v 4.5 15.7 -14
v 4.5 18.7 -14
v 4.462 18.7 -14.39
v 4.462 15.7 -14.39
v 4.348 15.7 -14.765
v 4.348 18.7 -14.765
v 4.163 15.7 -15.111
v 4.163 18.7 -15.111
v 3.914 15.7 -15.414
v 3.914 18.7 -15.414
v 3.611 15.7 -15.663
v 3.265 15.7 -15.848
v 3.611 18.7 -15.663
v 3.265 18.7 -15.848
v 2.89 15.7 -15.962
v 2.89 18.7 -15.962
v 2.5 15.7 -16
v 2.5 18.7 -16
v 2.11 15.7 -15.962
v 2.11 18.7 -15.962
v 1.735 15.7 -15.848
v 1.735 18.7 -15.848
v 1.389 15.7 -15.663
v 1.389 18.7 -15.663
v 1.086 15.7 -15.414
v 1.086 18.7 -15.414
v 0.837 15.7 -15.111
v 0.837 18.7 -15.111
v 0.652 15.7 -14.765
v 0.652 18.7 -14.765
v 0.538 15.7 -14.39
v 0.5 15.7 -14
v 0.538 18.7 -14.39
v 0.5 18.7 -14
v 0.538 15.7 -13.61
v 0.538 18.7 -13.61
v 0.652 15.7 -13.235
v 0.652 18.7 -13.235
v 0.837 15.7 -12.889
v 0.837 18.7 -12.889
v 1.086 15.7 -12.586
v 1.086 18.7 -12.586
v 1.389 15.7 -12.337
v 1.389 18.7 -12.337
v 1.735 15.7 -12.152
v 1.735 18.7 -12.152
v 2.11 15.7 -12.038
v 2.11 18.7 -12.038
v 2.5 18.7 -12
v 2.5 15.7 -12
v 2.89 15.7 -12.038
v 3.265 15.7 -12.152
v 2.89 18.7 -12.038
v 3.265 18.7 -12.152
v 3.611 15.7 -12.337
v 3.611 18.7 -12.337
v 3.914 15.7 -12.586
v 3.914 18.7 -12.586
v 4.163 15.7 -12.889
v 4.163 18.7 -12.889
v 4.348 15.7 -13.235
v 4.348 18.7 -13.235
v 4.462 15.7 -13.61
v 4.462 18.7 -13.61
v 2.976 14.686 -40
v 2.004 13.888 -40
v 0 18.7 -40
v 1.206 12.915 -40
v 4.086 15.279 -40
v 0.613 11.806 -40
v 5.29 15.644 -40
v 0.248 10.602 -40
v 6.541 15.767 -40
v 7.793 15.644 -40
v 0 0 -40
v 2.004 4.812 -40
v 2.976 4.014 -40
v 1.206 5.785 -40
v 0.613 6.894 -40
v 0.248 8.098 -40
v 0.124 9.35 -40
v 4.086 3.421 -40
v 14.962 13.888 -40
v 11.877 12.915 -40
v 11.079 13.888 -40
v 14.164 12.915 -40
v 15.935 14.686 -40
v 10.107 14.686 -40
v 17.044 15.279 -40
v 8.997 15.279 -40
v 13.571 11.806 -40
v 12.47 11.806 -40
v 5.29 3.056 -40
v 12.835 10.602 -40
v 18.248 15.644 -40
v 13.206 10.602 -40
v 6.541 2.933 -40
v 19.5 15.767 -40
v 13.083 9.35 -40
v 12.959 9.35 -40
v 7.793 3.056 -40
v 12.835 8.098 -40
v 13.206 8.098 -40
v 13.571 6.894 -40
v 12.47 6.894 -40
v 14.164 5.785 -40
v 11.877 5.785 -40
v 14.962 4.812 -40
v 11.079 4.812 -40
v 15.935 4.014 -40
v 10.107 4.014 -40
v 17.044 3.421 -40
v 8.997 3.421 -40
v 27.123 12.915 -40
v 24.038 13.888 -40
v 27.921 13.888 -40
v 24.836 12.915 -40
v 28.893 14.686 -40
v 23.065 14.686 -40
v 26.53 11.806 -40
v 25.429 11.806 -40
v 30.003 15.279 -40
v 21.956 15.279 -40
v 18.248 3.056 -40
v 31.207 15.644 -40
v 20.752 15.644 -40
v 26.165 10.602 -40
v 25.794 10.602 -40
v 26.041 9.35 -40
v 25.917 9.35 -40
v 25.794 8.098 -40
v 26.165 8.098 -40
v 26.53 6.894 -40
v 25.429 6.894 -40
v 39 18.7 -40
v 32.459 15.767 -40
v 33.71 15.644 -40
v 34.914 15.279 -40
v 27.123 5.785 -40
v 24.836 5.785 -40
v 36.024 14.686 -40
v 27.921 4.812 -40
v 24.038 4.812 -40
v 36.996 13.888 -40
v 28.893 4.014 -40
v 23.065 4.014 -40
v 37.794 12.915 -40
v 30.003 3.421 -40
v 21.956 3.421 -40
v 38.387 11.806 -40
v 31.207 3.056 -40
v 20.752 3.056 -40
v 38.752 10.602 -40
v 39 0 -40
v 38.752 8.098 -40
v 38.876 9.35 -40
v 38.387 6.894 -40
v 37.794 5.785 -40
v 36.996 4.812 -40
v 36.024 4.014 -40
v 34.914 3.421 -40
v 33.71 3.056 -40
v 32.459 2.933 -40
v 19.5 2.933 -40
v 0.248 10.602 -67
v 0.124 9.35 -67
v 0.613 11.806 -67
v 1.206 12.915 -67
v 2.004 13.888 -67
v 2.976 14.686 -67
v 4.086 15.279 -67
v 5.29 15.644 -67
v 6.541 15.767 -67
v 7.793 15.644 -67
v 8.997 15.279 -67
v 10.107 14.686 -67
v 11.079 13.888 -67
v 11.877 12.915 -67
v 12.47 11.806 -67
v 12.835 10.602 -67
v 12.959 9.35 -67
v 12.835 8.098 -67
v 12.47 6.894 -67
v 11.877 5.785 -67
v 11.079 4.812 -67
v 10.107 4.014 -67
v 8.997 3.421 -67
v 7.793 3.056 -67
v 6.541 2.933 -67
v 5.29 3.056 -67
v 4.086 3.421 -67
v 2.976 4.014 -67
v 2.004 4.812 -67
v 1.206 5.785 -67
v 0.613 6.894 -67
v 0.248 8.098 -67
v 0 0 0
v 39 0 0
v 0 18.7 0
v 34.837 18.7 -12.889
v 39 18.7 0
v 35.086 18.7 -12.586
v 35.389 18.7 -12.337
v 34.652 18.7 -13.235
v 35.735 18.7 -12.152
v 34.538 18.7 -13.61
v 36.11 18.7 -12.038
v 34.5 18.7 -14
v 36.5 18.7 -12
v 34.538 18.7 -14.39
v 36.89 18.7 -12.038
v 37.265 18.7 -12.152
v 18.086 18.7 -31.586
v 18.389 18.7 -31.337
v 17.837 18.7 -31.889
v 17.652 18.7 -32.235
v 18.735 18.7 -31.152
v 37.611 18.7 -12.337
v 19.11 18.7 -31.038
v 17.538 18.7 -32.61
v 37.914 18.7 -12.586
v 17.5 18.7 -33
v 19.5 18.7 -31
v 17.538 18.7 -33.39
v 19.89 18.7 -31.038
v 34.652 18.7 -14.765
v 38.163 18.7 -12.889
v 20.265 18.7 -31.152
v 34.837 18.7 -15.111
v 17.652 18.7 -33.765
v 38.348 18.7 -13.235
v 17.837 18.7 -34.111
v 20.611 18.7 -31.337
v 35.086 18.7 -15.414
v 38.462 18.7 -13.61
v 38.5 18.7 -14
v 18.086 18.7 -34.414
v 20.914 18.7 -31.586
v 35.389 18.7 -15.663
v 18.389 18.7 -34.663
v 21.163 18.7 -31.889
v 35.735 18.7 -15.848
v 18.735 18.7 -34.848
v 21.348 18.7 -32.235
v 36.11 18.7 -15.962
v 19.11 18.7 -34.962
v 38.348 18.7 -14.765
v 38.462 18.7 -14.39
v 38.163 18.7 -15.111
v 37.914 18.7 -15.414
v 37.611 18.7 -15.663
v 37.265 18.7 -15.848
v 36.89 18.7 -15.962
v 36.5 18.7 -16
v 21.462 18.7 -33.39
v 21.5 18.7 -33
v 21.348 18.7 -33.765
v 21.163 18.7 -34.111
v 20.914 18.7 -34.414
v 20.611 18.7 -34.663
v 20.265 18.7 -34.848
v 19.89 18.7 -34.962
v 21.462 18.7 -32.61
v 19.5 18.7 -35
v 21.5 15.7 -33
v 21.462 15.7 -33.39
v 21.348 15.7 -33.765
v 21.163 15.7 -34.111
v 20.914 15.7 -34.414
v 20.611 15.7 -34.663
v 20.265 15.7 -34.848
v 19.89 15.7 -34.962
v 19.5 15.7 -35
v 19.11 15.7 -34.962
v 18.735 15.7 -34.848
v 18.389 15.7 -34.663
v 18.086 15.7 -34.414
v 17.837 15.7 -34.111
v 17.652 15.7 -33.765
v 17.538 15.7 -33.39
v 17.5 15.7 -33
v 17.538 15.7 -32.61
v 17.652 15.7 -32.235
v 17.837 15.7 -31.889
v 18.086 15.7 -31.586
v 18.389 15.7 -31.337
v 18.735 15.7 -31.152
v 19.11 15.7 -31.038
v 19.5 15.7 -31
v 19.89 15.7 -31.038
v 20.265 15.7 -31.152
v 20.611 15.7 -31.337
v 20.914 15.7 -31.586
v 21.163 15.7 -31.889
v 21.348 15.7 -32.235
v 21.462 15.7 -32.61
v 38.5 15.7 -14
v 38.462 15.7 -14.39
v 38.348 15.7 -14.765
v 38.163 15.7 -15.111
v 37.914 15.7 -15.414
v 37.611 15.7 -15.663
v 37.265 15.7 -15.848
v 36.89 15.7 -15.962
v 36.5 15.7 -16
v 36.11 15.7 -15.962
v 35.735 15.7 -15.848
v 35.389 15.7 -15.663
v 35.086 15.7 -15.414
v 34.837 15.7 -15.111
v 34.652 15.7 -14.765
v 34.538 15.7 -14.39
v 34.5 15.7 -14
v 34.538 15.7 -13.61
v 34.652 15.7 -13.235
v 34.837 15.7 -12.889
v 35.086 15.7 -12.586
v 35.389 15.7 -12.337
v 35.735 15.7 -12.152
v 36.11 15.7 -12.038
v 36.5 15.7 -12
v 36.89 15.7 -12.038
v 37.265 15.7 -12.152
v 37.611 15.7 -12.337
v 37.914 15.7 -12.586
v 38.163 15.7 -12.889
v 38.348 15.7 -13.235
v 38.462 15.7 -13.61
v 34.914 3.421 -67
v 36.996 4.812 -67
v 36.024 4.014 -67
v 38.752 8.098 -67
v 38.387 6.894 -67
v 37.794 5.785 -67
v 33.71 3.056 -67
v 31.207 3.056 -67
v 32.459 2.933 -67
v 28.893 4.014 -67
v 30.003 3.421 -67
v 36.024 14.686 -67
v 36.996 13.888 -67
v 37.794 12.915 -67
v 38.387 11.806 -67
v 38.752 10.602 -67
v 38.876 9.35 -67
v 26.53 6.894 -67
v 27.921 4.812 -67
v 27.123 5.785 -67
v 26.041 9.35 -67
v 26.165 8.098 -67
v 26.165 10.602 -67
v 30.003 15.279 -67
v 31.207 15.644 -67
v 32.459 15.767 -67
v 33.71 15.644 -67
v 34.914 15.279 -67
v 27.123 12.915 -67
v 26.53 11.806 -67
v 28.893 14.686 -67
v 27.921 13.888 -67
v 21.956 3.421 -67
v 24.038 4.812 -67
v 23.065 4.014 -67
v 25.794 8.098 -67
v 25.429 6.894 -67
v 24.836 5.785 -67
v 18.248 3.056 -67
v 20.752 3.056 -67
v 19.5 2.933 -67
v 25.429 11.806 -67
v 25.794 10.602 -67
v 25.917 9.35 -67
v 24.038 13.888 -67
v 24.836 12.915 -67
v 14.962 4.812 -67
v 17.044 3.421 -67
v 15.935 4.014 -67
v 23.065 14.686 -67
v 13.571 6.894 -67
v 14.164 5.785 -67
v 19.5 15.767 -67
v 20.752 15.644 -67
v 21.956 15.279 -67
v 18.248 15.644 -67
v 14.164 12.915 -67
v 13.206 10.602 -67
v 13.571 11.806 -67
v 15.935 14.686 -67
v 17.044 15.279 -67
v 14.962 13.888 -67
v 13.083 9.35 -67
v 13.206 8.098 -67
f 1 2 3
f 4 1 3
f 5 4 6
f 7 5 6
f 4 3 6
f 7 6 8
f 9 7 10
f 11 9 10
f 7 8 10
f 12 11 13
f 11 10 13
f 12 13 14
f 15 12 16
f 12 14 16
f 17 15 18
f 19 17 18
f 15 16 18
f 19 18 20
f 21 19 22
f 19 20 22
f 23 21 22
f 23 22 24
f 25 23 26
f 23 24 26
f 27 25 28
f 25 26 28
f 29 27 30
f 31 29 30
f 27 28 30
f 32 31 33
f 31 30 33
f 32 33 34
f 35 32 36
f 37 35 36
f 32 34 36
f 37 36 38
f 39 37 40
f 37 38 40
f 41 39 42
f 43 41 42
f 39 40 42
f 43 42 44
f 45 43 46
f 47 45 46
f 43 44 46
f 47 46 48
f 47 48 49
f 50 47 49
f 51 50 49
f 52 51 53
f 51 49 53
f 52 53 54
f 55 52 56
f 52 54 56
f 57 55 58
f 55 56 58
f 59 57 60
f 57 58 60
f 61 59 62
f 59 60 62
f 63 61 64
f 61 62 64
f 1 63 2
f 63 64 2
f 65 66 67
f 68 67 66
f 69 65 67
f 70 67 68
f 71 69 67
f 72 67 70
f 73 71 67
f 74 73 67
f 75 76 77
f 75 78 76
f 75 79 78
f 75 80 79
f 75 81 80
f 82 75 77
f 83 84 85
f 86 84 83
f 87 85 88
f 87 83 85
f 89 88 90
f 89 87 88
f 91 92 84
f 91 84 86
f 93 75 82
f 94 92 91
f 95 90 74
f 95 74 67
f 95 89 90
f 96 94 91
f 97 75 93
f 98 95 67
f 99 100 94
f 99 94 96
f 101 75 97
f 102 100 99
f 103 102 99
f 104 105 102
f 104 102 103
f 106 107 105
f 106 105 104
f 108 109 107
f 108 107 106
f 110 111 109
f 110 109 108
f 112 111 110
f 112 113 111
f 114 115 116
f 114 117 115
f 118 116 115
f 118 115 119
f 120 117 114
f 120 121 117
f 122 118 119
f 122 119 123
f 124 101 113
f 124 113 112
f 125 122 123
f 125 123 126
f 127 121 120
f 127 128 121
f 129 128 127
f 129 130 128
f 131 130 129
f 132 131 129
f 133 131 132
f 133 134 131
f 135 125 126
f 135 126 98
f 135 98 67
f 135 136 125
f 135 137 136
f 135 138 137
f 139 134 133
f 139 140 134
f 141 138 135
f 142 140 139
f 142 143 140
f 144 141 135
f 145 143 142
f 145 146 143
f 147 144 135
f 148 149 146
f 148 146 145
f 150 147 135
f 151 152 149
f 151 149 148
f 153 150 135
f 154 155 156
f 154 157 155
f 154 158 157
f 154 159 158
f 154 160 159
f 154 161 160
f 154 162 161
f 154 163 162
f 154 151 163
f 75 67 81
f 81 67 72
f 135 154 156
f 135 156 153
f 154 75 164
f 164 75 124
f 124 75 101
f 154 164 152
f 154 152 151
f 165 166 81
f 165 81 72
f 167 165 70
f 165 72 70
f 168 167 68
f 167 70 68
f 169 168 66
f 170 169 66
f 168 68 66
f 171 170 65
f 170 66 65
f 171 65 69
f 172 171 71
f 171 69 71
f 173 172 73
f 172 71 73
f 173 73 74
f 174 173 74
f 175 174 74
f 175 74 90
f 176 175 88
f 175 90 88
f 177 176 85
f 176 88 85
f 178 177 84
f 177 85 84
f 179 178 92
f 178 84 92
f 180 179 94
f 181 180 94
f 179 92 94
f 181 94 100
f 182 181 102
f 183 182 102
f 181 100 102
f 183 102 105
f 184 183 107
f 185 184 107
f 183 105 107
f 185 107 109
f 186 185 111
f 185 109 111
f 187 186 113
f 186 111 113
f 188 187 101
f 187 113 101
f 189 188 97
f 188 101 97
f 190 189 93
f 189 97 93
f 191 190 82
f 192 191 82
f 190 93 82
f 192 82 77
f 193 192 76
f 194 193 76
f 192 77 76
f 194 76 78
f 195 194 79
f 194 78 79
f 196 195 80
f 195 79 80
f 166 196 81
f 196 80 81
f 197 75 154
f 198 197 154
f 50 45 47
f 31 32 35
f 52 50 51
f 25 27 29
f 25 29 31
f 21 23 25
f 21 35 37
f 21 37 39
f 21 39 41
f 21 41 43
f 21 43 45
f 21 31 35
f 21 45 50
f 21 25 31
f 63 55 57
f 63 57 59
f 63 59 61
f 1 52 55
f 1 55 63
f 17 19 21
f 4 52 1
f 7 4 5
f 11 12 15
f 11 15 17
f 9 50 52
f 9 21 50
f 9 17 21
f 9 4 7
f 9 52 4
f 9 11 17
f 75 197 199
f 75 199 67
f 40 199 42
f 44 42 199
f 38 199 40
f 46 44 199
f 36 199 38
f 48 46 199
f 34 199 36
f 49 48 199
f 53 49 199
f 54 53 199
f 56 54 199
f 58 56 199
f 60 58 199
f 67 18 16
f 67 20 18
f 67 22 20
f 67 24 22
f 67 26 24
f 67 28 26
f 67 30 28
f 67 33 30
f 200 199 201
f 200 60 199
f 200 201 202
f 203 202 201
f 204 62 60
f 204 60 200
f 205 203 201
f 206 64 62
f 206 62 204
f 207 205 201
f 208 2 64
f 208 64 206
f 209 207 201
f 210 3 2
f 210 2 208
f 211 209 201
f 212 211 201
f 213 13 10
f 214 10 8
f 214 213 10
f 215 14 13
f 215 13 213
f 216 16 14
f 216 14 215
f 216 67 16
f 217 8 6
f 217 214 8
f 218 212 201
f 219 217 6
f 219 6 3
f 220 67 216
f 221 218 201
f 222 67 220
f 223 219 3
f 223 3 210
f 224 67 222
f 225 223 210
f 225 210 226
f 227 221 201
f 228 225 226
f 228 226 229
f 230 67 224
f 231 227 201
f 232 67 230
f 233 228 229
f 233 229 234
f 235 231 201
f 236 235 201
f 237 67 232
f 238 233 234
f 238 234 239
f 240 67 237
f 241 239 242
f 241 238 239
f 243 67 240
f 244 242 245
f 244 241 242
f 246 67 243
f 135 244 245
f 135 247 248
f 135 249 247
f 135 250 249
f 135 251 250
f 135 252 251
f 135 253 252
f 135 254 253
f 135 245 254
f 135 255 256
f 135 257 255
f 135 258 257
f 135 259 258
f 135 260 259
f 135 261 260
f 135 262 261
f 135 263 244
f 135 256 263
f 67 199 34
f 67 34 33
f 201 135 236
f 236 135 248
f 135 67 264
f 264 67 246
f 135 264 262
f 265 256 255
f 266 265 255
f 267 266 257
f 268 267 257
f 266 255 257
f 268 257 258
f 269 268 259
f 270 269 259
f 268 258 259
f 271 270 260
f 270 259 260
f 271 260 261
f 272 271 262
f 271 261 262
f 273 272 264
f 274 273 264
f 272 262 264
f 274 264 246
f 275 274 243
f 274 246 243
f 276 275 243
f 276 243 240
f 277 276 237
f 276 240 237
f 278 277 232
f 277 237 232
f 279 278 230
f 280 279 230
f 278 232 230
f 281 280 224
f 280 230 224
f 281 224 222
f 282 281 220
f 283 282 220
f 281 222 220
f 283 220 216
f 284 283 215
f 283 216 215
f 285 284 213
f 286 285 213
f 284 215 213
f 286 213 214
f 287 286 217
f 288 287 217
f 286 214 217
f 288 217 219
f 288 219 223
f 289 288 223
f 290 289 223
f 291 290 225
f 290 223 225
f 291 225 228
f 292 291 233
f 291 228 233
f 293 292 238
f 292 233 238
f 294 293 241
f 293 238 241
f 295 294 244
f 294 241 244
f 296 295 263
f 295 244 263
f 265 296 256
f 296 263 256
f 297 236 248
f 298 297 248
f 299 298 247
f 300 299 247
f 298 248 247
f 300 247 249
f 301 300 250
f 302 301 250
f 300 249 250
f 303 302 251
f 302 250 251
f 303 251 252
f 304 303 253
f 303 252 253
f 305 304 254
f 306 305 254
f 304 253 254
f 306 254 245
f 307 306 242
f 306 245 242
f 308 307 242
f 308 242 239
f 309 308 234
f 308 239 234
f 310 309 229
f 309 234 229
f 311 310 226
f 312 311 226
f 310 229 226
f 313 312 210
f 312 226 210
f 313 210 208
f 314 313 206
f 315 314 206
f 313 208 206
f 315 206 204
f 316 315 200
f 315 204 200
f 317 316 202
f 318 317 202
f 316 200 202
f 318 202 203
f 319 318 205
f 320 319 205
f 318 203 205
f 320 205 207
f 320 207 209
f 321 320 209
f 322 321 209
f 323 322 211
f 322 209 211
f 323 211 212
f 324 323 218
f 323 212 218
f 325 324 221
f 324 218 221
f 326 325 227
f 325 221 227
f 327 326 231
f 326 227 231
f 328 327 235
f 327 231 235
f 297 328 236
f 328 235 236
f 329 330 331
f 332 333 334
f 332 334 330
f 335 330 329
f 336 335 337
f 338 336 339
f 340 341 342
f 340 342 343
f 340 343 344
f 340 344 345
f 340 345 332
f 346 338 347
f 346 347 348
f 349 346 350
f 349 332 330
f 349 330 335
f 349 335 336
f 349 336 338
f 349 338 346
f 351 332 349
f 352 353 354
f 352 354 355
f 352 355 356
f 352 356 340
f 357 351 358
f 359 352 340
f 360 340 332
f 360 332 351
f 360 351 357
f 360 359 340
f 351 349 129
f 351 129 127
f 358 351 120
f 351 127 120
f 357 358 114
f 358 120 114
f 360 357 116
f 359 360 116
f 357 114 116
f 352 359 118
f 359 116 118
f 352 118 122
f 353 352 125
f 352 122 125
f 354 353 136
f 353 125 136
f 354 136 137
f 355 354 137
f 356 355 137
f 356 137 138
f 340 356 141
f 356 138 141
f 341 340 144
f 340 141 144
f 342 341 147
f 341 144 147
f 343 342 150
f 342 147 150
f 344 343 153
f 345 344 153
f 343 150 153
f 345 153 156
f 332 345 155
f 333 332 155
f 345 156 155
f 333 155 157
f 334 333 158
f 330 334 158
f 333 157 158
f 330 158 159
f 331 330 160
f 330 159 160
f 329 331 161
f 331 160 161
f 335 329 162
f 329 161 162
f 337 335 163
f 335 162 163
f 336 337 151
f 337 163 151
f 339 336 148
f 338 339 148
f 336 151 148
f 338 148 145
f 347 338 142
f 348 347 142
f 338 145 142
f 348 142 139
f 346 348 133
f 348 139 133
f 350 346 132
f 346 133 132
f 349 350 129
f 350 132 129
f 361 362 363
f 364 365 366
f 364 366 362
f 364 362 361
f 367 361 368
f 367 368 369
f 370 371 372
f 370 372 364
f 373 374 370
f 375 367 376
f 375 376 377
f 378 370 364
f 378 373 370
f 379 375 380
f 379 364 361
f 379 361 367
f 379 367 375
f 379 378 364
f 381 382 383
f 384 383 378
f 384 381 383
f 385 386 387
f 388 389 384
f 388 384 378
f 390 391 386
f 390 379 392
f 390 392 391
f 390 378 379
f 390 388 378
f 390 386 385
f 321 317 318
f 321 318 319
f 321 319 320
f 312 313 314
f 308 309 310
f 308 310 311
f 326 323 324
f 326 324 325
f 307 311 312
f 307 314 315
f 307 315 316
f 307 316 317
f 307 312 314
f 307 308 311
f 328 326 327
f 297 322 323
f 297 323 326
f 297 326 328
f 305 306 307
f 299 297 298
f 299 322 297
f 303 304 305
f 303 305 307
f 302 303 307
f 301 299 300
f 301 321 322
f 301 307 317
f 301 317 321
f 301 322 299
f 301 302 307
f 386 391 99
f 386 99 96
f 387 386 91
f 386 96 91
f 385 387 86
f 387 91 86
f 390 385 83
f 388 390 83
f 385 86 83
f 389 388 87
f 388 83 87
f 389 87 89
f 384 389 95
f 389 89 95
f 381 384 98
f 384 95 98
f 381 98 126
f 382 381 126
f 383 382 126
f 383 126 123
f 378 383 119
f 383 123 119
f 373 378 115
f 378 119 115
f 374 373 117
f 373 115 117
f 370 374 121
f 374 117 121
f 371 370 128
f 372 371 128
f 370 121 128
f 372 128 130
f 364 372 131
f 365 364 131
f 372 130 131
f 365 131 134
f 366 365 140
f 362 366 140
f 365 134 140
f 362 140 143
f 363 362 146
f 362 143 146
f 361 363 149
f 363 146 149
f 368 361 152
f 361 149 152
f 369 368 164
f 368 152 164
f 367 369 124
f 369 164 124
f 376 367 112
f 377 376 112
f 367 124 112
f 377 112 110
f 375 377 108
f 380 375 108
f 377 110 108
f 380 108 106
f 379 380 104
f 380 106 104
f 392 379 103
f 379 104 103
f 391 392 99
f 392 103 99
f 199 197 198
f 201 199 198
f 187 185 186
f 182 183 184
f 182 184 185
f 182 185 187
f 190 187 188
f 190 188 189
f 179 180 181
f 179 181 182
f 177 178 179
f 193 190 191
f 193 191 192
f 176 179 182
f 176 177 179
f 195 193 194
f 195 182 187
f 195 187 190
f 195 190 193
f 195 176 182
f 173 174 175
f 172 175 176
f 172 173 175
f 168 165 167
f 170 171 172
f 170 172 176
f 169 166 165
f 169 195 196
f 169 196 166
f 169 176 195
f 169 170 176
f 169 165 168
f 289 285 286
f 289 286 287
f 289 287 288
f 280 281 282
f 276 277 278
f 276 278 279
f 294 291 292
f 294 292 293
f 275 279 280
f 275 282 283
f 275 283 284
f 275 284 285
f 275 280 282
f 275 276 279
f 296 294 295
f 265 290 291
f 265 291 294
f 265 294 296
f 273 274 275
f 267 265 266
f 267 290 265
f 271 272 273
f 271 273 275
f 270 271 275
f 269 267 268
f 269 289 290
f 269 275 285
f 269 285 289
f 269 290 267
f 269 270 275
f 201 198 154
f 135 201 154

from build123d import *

# Parameters (mm, degrees)
SKETCH1_W           = 39
SKETCH1_H           = 40
BOSS_EXTRUDE1_DEPTH = 18.7
SKETCH2_R           = 2
CUT_EXTRUDE1_DEPTH  = 3
SKETCH3_R           = 6.417093559
BOSS_EXTRUDE4_DEPTH = 27


with BuildPart() as part:
    # Sketch1 → Boss-Extrude1 (new body)
    with BuildSketch(Plane(origin=(0, 0, 0), x_dir=(1, 0, 0), z_dir=(0, 1, 0))):
        with Locations((19.5, 20)):
            Rectangle(SKETCH1_W, SKETCH1_H)
    extrude(amount=BOSS_EXTRUDE1_DEPTH)

    # Sketch2 → Cut-Extrude1 (cut)
    with BuildSketch(Plane(origin=(0, 18.7, 0), x_dir=(1, 0, 0), z_dir=(0, 1, 0))):
        with Locations((2.5, 14)):
            Circle(SKETCH2_R)
        with Locations((36.5, 14)):
            Circle(SKETCH2_R)
        with Locations((19.5, 33)):
            Circle(SKETCH2_R)
    extrude(amount=-CUT_EXTRUDE1_DEPTH, mode=Mode.SUBTRACT)

    # Sketch3 → Boss-Extrude4 (add)
    with BuildSketch(Plane(origin=(0, 0, -40), x_dir=(-1, 0, 0), z_dir=(0, 0, -1))):
        with Locations((-32.458546779, 9.35)):
            Circle(SKETCH3_R)
        with Locations((-19.5, 9.35)):
            Circle(SKETCH3_R)
        with Locations((-6.541453221, 9.35)):
            Circle(SKETCH3_R)
    extrude(amount=BOSS_EXTRUDE4_DEPTH)


solid = part.part
